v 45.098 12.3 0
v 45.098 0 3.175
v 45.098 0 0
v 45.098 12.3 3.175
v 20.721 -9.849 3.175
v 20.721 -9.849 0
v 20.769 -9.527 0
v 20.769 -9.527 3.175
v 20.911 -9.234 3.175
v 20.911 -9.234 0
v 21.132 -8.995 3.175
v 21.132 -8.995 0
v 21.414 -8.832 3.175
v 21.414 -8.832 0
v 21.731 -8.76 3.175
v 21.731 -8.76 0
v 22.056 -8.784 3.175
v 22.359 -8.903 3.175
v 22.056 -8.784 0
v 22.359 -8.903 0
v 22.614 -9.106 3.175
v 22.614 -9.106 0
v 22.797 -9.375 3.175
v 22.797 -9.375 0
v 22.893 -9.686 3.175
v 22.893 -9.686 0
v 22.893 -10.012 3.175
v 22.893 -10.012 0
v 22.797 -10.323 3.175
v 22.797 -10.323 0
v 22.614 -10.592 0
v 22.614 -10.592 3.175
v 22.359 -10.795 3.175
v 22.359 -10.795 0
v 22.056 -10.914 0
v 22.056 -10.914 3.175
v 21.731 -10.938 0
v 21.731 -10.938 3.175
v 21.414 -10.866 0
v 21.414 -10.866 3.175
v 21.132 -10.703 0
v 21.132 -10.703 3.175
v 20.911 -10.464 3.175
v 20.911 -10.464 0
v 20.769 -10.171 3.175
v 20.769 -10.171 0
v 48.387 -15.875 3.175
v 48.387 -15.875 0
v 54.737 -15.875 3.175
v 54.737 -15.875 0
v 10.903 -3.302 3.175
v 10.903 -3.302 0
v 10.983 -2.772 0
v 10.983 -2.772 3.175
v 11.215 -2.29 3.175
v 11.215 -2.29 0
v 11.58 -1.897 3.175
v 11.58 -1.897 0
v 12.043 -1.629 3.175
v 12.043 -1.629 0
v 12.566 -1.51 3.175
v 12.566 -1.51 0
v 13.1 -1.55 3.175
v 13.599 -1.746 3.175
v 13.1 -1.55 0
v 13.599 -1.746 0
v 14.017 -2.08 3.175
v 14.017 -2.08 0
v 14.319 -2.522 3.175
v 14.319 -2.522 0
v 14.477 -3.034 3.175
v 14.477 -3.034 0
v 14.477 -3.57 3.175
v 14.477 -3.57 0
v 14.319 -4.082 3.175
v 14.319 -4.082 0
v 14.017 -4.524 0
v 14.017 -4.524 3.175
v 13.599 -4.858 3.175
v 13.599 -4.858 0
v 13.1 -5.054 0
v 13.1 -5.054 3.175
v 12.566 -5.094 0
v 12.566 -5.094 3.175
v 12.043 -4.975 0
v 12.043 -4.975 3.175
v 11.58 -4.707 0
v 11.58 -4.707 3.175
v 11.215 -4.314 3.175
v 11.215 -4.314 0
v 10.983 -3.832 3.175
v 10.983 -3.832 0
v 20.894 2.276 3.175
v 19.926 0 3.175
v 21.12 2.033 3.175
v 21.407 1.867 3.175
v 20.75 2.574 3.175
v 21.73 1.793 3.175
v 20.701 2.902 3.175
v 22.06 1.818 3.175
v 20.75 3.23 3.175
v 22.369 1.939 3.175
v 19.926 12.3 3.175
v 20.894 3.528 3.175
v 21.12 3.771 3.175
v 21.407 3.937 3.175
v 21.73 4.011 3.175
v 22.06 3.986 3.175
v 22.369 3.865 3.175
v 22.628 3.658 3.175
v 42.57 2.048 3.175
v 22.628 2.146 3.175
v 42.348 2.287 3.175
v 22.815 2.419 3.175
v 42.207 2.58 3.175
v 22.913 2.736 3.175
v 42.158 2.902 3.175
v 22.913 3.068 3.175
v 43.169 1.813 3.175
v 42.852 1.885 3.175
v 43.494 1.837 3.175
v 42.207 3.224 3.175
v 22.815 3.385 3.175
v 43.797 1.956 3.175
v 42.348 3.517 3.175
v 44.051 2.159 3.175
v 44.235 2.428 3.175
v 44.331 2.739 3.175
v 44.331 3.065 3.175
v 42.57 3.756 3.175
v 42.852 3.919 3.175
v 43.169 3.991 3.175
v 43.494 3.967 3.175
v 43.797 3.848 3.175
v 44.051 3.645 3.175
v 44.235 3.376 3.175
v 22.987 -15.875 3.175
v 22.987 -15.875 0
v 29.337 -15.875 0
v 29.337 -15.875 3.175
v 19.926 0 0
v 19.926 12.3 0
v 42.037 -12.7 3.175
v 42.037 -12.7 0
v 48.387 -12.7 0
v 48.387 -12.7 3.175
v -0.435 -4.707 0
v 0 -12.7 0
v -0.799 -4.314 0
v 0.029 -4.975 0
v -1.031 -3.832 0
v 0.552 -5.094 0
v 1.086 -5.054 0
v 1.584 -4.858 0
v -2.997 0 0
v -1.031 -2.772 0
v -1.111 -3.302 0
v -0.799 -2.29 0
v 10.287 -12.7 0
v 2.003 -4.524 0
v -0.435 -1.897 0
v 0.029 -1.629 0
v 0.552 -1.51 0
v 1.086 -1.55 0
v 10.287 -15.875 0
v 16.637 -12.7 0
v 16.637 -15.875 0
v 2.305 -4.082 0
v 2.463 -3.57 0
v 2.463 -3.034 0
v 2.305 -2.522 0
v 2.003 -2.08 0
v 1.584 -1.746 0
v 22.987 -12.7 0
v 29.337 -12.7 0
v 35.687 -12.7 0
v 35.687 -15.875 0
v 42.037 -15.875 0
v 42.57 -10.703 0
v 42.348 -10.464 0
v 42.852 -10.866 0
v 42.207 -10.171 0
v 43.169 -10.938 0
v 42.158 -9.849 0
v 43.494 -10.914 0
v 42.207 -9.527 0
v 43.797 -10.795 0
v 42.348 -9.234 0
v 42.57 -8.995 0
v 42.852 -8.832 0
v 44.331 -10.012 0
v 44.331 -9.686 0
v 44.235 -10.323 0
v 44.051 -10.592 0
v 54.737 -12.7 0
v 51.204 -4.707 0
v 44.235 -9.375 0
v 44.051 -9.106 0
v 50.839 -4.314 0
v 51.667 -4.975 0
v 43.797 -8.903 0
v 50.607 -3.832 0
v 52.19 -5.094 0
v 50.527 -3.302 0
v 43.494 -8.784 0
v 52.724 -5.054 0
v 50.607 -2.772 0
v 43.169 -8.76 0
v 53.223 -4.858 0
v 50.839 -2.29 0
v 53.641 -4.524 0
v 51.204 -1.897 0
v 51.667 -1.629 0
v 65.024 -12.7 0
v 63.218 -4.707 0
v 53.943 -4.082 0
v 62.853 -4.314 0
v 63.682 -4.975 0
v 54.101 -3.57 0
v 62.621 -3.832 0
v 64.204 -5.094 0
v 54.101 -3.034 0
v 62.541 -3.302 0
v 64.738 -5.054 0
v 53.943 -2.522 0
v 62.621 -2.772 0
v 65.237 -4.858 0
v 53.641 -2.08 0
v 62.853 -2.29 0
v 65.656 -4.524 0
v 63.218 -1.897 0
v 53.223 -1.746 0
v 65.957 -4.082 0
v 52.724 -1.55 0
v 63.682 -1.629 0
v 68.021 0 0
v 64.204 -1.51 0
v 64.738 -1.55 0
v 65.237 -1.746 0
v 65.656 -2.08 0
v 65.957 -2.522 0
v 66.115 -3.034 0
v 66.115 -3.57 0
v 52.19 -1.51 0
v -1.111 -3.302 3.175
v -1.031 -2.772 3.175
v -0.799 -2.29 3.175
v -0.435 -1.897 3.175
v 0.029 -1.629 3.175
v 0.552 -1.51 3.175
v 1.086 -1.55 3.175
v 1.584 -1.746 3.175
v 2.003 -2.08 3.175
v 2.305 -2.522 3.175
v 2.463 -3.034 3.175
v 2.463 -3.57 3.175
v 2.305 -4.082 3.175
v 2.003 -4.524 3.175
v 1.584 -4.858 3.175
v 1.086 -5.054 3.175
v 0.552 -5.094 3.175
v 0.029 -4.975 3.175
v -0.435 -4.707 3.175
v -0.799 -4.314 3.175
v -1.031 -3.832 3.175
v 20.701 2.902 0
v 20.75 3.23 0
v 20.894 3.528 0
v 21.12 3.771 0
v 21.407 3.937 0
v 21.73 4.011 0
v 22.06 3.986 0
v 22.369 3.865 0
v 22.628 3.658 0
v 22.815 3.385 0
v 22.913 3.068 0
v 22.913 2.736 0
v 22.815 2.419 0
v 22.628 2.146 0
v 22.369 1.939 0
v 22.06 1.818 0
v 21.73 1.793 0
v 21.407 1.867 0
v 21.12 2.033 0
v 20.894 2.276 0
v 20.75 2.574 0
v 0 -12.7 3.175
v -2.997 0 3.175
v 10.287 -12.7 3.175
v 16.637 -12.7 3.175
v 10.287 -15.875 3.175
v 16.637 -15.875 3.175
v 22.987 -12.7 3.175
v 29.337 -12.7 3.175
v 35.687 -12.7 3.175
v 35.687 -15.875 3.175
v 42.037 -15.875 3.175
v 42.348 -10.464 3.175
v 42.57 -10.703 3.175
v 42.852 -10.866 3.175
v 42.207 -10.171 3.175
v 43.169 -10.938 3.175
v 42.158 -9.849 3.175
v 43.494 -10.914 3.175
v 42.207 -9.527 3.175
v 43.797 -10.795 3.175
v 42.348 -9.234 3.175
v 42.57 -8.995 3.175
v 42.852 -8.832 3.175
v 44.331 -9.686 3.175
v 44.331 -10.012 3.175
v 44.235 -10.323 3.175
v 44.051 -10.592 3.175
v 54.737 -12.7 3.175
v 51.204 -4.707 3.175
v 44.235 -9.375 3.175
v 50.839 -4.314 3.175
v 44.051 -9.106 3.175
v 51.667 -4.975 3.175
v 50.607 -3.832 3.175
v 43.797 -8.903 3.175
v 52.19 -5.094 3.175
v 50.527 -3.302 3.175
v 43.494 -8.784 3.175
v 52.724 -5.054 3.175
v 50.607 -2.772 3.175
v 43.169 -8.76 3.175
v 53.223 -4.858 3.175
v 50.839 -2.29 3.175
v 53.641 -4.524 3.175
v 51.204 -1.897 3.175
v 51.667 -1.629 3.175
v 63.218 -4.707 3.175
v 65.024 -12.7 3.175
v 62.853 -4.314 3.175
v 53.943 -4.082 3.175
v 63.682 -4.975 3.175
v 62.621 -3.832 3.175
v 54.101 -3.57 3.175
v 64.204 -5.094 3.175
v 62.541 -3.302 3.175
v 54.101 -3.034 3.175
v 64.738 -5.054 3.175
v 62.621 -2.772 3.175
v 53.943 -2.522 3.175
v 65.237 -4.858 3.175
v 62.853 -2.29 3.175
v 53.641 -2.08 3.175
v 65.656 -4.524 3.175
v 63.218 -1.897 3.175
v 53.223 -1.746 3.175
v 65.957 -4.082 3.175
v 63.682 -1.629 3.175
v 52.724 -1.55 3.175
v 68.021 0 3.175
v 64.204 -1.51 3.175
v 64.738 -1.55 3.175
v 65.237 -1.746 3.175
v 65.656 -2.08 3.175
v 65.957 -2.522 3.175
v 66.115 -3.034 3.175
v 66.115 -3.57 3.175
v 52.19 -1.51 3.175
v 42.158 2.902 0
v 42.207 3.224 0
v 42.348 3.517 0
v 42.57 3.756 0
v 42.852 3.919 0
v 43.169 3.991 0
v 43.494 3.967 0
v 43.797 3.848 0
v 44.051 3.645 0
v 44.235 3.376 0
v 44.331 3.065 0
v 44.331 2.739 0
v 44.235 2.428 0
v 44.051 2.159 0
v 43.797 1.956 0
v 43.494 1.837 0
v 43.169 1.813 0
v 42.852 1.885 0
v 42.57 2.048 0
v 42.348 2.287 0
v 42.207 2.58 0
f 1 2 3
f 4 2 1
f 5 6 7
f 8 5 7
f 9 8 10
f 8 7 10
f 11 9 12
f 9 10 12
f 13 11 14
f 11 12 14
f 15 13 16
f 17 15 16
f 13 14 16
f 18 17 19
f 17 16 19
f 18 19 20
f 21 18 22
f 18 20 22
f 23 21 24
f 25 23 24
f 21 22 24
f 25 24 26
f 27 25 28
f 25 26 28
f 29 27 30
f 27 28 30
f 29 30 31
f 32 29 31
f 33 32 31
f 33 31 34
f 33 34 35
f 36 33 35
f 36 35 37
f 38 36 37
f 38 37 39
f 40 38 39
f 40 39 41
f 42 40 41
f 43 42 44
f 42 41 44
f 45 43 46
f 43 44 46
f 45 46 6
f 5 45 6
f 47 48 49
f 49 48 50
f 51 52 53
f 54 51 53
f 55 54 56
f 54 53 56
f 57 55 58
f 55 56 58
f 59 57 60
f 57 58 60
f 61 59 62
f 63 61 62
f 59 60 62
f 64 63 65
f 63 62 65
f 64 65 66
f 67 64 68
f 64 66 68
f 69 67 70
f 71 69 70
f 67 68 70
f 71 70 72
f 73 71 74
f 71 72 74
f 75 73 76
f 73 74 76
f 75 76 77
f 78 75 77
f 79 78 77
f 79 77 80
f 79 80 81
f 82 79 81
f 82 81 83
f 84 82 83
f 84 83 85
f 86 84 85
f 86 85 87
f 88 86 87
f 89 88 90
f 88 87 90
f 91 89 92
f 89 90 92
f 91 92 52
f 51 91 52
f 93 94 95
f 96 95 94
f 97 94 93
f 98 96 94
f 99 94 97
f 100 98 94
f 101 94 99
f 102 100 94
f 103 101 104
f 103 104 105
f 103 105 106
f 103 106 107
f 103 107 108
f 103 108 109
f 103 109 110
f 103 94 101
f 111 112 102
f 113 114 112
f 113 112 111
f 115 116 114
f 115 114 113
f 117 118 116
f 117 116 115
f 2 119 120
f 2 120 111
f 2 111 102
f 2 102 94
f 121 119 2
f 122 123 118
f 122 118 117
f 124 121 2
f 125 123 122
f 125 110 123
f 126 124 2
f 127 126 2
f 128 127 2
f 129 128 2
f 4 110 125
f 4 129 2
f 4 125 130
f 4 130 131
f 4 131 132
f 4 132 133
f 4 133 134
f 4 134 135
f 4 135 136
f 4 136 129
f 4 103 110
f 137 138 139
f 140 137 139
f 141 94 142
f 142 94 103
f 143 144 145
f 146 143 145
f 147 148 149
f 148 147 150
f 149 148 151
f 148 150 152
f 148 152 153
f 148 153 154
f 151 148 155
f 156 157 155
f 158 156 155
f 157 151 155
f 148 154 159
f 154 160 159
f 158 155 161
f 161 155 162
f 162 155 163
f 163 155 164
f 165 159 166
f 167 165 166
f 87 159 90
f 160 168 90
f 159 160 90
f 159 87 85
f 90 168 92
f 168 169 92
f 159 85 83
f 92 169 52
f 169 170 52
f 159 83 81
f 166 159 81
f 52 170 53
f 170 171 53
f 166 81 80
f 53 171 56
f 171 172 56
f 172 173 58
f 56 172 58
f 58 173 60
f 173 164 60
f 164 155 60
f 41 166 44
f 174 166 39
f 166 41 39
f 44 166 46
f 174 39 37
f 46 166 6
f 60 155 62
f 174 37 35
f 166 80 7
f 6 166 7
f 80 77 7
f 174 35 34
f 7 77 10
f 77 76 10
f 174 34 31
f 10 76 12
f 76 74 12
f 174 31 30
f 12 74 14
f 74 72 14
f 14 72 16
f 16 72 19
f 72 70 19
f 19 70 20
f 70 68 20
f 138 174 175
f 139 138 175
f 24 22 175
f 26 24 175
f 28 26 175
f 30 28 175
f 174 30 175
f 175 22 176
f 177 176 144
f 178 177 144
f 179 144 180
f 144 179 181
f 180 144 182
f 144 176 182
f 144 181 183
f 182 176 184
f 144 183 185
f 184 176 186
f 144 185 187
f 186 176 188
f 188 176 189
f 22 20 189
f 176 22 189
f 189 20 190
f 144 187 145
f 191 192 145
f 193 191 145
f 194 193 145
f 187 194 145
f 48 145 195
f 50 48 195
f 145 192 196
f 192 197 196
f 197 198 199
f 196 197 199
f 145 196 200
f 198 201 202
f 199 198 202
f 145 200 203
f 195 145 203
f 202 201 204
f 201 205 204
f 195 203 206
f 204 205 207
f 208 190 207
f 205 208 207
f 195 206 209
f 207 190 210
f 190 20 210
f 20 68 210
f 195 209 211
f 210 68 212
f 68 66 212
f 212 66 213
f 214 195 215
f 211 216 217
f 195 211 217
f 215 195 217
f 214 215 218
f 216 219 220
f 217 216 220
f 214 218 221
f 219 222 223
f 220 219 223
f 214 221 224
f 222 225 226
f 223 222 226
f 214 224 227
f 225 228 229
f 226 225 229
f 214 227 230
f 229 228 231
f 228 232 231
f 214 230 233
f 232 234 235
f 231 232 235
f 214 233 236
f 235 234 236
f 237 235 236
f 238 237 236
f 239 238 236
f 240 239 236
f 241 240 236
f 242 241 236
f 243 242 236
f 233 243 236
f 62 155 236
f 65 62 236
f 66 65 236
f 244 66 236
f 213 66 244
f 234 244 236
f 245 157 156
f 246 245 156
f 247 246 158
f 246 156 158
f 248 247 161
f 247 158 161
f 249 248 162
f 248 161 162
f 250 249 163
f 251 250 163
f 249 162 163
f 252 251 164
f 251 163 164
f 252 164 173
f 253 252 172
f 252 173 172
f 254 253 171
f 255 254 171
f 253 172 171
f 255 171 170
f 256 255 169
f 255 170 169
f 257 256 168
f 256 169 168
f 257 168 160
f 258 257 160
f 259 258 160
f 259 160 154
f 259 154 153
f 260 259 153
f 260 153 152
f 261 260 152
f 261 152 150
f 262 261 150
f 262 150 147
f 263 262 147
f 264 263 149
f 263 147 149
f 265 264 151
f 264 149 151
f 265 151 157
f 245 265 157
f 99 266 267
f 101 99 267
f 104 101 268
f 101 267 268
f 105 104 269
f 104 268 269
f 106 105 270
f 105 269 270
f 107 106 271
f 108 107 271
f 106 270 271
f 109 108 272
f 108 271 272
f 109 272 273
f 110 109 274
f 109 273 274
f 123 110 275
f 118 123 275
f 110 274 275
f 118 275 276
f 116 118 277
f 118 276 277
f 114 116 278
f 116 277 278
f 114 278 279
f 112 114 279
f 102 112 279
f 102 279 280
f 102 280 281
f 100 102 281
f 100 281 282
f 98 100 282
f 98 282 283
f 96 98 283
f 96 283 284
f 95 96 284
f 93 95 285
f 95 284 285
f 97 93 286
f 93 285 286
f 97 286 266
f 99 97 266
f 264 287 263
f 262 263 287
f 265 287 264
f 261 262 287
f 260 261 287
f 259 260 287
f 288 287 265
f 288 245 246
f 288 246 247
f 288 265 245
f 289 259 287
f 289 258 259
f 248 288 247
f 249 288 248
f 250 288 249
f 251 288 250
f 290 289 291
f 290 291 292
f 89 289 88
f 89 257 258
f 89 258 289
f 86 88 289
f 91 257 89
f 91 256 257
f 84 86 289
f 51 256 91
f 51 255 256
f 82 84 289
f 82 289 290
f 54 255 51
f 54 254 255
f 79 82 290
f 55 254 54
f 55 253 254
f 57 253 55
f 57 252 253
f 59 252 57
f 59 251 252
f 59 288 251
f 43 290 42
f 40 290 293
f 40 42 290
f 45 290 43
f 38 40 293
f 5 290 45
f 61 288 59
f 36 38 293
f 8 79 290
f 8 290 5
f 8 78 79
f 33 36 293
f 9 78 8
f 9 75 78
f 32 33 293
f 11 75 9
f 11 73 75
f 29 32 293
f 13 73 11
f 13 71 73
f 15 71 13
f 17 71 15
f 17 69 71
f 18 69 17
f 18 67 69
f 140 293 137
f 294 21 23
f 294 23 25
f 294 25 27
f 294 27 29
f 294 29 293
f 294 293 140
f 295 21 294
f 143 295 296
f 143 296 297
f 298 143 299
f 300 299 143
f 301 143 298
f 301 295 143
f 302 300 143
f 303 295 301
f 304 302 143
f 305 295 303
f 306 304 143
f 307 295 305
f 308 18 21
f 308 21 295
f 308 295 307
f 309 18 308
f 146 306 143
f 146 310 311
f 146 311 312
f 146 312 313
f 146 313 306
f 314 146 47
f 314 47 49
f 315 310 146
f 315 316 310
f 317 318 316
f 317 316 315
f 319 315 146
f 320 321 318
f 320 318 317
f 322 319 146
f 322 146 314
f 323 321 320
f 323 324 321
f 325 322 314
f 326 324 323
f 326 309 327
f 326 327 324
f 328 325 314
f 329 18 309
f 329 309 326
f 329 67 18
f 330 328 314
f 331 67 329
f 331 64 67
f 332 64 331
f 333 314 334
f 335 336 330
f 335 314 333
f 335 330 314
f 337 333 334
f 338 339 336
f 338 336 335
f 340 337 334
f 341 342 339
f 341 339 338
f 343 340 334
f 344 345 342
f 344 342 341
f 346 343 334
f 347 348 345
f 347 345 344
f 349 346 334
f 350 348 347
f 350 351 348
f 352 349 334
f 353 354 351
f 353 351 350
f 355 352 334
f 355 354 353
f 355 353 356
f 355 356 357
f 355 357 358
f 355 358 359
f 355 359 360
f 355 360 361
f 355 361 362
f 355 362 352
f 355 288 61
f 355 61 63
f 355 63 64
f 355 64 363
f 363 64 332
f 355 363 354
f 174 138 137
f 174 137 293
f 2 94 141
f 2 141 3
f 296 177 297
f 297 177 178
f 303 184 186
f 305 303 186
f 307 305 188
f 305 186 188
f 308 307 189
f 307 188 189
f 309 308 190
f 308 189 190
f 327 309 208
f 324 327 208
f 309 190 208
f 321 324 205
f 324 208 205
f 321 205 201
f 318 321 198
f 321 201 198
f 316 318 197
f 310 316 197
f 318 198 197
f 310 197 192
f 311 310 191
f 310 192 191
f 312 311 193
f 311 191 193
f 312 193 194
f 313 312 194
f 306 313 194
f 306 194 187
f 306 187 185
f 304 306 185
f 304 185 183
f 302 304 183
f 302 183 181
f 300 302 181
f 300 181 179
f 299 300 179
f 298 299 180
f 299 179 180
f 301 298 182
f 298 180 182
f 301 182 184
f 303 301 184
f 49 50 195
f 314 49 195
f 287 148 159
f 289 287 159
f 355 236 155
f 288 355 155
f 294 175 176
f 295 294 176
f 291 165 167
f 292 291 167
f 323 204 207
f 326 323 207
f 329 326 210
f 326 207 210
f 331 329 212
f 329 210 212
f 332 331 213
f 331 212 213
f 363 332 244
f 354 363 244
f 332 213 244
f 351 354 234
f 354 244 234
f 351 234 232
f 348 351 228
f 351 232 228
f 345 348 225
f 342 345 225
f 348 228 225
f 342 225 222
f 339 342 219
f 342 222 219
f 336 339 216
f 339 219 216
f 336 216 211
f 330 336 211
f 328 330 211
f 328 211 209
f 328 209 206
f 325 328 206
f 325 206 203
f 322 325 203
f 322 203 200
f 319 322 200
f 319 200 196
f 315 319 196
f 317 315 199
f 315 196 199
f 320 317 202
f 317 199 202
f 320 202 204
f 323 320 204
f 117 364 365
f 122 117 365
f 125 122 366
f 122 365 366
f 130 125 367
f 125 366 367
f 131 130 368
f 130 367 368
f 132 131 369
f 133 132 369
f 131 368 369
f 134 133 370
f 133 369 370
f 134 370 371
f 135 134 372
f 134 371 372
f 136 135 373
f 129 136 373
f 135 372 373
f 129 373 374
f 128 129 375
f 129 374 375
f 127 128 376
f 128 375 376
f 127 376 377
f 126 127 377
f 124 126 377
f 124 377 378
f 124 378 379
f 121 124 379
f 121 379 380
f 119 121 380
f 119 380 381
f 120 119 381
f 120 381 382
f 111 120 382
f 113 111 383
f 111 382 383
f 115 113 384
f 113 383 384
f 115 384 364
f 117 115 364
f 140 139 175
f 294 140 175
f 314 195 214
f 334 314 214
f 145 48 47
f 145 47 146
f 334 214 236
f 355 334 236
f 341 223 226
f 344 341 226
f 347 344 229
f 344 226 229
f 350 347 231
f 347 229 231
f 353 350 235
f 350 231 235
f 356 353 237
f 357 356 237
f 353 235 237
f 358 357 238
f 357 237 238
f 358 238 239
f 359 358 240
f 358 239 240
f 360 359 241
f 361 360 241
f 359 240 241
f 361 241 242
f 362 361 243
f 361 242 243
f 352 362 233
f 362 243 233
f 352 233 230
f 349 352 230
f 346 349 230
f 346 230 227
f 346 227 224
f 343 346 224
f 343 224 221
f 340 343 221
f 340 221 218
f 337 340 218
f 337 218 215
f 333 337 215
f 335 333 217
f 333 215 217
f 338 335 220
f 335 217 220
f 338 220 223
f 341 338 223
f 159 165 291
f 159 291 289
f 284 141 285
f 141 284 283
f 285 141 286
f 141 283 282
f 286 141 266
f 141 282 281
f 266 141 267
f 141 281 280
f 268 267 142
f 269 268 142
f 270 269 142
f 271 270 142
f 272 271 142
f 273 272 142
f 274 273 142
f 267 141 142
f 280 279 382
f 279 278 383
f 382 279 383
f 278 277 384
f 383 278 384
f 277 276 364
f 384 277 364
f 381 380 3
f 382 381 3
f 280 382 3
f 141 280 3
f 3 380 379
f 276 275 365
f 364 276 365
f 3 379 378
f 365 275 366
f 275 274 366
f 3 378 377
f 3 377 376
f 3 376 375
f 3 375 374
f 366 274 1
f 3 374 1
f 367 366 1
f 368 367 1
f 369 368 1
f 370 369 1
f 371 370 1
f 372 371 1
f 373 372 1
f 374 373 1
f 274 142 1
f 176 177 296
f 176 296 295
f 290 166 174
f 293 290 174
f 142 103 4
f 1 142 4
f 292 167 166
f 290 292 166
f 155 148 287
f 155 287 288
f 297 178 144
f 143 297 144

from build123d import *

# Parameters (mm, degrees)
SKETCH1_W           = 6.35
SKETCH1_H           = 3.175
BOSS_EXTRUDE1_DEPTH = 3.175
SKETCH2_W           = 65.60314911
SKETCH2_H           = 5.913175186
CUT_EXTRUDE2_DEPTH  = 10
SKETCH3_W           = 25.1714
SKETCH3_H           = 12.3
BOSS_EXTRUDE2_DEPTH = 3.175
SKETCH6_R           = 1.0922
SKETCH6_R_2         = 1.112076506
CUT_EXTRUDE3_DEPTH  = 3.175
SKETCH8_R           = 1.79705
CUT_EXTRUDE4_DEPTH  = 3.175


with BuildPart() as part:
    # Sketch1 → Boss-Extrude1 (new body)
    with BuildSketch(Plane.XY):
        Polygon((10.287, 0), (0, 0), (0, -12.7), (10.287, -12.7), (16.637, -12.7), (22.987, -12.7), (29.337, -12.7), (35.687, -12.7), (42.037, -12.7), (48.387, -12.7), (54.737, -12.7), (65.024, -12.7), (65.024, 0), (54.737, 0), (48.387, 0), (42.037, 0), (35.687, 0), (29.337, 0), (22.987, 0), (16.637, 0), align=None)
        with Locations((13.462, 1.5875)):
            Rectangle(SKETCH1_W, SKETCH1_H)
        with Locations((26.162, 1.5875)):
            Rectangle(SKETCH1_W, SKETCH1_H)
        with Locations((51.562, 1.5875)):
            Rectangle(SKETCH1_W, SKETCH1_H)
        with Locations((51.562, -14.2875)):
            Rectangle(SKETCH1_W, SKETCH1_H)
        with Locations((38.862, -14.2875)):
            Rectangle(SKETCH1_W, SKETCH1_H)
        with Locations((26.162, -14.2875)):
            Rectangle(SKETCH1_W, SKETCH1_H)
        with Locations((13.462, -14.2875)):
            Rectangle(SKETCH1_W, SKETCH1_H)
        Polygon((-2.9972, 0), (0, 0), (0, -12.7), align=None)
        Polygon((65.024, 0), (65.024, -12.7), (68.0212, 0), align=None)
        with Locations((38.862, 1.5875)):
            Rectangle(SKETCH1_W, SKETCH1_H)
    extrude(amount=BOSS_EXTRUDE1_DEPTH)

    # Sketch2 → Cut-Extrude2 (cut)
    with BuildSketch(Plane.XY.offset(3.175)):
        with Locations((32.801574555, 2.956587593)):
            Rectangle(SKETCH2_W, SKETCH2_H)
    extrude(amount=-CUT_EXTRUDE2_DEPTH, mode=Mode.SUBTRACT)


with BuildPart() as body_2:
    # Sketch3 → Boss-Extrude2 (new body)
    with BuildSketch(Plane.XY.offset(3.175)):
        with Locations((32.512, 6.15)):
            Rectangle(SKETCH3_W, SKETCH3_H)
    extrude(amount=-BOSS_EXTRUDE2_DEPTH)


with BuildPart() as cut_extrude3_tool:
    # Sketch6 → Cut-Extrude3 (new body)
    with BuildSketch(Plane(origin=(0, 0, 0), x_dir=(-1, 0, 0), z_dir=(0, 0, -1))):
        with Locations((-43.25056982, 2.902)):
            Circle(SKETCH6_R)
        with Locations((-21.81296982, 2.902)):
            Circle(SKETCH6_R_2)
        with Locations((-21.81296982, -9.8488)):
            Circle(SKETCH6_R)
        with Locations((-43.25056982, -9.8488)):
            Circle(SKETCH6_R)
    extrude(amount=-CUT_EXTRUDE3_DEPTH)


with BuildPart() as part_1:
    add(part.part)

    # Cut-Extrude3: cut by cut_extrude3_tool
    add(cut_extrude3_tool.part, mode=Mode.SUBTRACT)

    # Sketch8 → Cut-Extrude4 (cut)
    with BuildSketch(Plane(origin=(0, 0, 0), x_dir=(-1, 0, 0), z_dir=(0, 0, -1))):
        with Locations((-64.3382, -3.302)):
            Circle(SKETCH8_R)
        with Locations((-52.324, -3.302)):
            Circle(SKETCH8_R)
        with Locations((-12.7, -3.302)):
            Circle(SKETCH8_R)
        with Locations((-0.6858, -3.302)):
            Circle(SKETCH8_R)
    extrude(amount=-CUT_EXTRUDE4_DEPTH, mode=Mode.SUBTRACT)


with BuildPart() as body_2_1:
    add(body_2.part)

    # Cut-Extrude3: cut by cut_extrude3_tool
    add(cut_extrude3_tool.part, mode=Mode.SUBTRACT)


solid = Compound([part_1.part, body_2_1.part])
